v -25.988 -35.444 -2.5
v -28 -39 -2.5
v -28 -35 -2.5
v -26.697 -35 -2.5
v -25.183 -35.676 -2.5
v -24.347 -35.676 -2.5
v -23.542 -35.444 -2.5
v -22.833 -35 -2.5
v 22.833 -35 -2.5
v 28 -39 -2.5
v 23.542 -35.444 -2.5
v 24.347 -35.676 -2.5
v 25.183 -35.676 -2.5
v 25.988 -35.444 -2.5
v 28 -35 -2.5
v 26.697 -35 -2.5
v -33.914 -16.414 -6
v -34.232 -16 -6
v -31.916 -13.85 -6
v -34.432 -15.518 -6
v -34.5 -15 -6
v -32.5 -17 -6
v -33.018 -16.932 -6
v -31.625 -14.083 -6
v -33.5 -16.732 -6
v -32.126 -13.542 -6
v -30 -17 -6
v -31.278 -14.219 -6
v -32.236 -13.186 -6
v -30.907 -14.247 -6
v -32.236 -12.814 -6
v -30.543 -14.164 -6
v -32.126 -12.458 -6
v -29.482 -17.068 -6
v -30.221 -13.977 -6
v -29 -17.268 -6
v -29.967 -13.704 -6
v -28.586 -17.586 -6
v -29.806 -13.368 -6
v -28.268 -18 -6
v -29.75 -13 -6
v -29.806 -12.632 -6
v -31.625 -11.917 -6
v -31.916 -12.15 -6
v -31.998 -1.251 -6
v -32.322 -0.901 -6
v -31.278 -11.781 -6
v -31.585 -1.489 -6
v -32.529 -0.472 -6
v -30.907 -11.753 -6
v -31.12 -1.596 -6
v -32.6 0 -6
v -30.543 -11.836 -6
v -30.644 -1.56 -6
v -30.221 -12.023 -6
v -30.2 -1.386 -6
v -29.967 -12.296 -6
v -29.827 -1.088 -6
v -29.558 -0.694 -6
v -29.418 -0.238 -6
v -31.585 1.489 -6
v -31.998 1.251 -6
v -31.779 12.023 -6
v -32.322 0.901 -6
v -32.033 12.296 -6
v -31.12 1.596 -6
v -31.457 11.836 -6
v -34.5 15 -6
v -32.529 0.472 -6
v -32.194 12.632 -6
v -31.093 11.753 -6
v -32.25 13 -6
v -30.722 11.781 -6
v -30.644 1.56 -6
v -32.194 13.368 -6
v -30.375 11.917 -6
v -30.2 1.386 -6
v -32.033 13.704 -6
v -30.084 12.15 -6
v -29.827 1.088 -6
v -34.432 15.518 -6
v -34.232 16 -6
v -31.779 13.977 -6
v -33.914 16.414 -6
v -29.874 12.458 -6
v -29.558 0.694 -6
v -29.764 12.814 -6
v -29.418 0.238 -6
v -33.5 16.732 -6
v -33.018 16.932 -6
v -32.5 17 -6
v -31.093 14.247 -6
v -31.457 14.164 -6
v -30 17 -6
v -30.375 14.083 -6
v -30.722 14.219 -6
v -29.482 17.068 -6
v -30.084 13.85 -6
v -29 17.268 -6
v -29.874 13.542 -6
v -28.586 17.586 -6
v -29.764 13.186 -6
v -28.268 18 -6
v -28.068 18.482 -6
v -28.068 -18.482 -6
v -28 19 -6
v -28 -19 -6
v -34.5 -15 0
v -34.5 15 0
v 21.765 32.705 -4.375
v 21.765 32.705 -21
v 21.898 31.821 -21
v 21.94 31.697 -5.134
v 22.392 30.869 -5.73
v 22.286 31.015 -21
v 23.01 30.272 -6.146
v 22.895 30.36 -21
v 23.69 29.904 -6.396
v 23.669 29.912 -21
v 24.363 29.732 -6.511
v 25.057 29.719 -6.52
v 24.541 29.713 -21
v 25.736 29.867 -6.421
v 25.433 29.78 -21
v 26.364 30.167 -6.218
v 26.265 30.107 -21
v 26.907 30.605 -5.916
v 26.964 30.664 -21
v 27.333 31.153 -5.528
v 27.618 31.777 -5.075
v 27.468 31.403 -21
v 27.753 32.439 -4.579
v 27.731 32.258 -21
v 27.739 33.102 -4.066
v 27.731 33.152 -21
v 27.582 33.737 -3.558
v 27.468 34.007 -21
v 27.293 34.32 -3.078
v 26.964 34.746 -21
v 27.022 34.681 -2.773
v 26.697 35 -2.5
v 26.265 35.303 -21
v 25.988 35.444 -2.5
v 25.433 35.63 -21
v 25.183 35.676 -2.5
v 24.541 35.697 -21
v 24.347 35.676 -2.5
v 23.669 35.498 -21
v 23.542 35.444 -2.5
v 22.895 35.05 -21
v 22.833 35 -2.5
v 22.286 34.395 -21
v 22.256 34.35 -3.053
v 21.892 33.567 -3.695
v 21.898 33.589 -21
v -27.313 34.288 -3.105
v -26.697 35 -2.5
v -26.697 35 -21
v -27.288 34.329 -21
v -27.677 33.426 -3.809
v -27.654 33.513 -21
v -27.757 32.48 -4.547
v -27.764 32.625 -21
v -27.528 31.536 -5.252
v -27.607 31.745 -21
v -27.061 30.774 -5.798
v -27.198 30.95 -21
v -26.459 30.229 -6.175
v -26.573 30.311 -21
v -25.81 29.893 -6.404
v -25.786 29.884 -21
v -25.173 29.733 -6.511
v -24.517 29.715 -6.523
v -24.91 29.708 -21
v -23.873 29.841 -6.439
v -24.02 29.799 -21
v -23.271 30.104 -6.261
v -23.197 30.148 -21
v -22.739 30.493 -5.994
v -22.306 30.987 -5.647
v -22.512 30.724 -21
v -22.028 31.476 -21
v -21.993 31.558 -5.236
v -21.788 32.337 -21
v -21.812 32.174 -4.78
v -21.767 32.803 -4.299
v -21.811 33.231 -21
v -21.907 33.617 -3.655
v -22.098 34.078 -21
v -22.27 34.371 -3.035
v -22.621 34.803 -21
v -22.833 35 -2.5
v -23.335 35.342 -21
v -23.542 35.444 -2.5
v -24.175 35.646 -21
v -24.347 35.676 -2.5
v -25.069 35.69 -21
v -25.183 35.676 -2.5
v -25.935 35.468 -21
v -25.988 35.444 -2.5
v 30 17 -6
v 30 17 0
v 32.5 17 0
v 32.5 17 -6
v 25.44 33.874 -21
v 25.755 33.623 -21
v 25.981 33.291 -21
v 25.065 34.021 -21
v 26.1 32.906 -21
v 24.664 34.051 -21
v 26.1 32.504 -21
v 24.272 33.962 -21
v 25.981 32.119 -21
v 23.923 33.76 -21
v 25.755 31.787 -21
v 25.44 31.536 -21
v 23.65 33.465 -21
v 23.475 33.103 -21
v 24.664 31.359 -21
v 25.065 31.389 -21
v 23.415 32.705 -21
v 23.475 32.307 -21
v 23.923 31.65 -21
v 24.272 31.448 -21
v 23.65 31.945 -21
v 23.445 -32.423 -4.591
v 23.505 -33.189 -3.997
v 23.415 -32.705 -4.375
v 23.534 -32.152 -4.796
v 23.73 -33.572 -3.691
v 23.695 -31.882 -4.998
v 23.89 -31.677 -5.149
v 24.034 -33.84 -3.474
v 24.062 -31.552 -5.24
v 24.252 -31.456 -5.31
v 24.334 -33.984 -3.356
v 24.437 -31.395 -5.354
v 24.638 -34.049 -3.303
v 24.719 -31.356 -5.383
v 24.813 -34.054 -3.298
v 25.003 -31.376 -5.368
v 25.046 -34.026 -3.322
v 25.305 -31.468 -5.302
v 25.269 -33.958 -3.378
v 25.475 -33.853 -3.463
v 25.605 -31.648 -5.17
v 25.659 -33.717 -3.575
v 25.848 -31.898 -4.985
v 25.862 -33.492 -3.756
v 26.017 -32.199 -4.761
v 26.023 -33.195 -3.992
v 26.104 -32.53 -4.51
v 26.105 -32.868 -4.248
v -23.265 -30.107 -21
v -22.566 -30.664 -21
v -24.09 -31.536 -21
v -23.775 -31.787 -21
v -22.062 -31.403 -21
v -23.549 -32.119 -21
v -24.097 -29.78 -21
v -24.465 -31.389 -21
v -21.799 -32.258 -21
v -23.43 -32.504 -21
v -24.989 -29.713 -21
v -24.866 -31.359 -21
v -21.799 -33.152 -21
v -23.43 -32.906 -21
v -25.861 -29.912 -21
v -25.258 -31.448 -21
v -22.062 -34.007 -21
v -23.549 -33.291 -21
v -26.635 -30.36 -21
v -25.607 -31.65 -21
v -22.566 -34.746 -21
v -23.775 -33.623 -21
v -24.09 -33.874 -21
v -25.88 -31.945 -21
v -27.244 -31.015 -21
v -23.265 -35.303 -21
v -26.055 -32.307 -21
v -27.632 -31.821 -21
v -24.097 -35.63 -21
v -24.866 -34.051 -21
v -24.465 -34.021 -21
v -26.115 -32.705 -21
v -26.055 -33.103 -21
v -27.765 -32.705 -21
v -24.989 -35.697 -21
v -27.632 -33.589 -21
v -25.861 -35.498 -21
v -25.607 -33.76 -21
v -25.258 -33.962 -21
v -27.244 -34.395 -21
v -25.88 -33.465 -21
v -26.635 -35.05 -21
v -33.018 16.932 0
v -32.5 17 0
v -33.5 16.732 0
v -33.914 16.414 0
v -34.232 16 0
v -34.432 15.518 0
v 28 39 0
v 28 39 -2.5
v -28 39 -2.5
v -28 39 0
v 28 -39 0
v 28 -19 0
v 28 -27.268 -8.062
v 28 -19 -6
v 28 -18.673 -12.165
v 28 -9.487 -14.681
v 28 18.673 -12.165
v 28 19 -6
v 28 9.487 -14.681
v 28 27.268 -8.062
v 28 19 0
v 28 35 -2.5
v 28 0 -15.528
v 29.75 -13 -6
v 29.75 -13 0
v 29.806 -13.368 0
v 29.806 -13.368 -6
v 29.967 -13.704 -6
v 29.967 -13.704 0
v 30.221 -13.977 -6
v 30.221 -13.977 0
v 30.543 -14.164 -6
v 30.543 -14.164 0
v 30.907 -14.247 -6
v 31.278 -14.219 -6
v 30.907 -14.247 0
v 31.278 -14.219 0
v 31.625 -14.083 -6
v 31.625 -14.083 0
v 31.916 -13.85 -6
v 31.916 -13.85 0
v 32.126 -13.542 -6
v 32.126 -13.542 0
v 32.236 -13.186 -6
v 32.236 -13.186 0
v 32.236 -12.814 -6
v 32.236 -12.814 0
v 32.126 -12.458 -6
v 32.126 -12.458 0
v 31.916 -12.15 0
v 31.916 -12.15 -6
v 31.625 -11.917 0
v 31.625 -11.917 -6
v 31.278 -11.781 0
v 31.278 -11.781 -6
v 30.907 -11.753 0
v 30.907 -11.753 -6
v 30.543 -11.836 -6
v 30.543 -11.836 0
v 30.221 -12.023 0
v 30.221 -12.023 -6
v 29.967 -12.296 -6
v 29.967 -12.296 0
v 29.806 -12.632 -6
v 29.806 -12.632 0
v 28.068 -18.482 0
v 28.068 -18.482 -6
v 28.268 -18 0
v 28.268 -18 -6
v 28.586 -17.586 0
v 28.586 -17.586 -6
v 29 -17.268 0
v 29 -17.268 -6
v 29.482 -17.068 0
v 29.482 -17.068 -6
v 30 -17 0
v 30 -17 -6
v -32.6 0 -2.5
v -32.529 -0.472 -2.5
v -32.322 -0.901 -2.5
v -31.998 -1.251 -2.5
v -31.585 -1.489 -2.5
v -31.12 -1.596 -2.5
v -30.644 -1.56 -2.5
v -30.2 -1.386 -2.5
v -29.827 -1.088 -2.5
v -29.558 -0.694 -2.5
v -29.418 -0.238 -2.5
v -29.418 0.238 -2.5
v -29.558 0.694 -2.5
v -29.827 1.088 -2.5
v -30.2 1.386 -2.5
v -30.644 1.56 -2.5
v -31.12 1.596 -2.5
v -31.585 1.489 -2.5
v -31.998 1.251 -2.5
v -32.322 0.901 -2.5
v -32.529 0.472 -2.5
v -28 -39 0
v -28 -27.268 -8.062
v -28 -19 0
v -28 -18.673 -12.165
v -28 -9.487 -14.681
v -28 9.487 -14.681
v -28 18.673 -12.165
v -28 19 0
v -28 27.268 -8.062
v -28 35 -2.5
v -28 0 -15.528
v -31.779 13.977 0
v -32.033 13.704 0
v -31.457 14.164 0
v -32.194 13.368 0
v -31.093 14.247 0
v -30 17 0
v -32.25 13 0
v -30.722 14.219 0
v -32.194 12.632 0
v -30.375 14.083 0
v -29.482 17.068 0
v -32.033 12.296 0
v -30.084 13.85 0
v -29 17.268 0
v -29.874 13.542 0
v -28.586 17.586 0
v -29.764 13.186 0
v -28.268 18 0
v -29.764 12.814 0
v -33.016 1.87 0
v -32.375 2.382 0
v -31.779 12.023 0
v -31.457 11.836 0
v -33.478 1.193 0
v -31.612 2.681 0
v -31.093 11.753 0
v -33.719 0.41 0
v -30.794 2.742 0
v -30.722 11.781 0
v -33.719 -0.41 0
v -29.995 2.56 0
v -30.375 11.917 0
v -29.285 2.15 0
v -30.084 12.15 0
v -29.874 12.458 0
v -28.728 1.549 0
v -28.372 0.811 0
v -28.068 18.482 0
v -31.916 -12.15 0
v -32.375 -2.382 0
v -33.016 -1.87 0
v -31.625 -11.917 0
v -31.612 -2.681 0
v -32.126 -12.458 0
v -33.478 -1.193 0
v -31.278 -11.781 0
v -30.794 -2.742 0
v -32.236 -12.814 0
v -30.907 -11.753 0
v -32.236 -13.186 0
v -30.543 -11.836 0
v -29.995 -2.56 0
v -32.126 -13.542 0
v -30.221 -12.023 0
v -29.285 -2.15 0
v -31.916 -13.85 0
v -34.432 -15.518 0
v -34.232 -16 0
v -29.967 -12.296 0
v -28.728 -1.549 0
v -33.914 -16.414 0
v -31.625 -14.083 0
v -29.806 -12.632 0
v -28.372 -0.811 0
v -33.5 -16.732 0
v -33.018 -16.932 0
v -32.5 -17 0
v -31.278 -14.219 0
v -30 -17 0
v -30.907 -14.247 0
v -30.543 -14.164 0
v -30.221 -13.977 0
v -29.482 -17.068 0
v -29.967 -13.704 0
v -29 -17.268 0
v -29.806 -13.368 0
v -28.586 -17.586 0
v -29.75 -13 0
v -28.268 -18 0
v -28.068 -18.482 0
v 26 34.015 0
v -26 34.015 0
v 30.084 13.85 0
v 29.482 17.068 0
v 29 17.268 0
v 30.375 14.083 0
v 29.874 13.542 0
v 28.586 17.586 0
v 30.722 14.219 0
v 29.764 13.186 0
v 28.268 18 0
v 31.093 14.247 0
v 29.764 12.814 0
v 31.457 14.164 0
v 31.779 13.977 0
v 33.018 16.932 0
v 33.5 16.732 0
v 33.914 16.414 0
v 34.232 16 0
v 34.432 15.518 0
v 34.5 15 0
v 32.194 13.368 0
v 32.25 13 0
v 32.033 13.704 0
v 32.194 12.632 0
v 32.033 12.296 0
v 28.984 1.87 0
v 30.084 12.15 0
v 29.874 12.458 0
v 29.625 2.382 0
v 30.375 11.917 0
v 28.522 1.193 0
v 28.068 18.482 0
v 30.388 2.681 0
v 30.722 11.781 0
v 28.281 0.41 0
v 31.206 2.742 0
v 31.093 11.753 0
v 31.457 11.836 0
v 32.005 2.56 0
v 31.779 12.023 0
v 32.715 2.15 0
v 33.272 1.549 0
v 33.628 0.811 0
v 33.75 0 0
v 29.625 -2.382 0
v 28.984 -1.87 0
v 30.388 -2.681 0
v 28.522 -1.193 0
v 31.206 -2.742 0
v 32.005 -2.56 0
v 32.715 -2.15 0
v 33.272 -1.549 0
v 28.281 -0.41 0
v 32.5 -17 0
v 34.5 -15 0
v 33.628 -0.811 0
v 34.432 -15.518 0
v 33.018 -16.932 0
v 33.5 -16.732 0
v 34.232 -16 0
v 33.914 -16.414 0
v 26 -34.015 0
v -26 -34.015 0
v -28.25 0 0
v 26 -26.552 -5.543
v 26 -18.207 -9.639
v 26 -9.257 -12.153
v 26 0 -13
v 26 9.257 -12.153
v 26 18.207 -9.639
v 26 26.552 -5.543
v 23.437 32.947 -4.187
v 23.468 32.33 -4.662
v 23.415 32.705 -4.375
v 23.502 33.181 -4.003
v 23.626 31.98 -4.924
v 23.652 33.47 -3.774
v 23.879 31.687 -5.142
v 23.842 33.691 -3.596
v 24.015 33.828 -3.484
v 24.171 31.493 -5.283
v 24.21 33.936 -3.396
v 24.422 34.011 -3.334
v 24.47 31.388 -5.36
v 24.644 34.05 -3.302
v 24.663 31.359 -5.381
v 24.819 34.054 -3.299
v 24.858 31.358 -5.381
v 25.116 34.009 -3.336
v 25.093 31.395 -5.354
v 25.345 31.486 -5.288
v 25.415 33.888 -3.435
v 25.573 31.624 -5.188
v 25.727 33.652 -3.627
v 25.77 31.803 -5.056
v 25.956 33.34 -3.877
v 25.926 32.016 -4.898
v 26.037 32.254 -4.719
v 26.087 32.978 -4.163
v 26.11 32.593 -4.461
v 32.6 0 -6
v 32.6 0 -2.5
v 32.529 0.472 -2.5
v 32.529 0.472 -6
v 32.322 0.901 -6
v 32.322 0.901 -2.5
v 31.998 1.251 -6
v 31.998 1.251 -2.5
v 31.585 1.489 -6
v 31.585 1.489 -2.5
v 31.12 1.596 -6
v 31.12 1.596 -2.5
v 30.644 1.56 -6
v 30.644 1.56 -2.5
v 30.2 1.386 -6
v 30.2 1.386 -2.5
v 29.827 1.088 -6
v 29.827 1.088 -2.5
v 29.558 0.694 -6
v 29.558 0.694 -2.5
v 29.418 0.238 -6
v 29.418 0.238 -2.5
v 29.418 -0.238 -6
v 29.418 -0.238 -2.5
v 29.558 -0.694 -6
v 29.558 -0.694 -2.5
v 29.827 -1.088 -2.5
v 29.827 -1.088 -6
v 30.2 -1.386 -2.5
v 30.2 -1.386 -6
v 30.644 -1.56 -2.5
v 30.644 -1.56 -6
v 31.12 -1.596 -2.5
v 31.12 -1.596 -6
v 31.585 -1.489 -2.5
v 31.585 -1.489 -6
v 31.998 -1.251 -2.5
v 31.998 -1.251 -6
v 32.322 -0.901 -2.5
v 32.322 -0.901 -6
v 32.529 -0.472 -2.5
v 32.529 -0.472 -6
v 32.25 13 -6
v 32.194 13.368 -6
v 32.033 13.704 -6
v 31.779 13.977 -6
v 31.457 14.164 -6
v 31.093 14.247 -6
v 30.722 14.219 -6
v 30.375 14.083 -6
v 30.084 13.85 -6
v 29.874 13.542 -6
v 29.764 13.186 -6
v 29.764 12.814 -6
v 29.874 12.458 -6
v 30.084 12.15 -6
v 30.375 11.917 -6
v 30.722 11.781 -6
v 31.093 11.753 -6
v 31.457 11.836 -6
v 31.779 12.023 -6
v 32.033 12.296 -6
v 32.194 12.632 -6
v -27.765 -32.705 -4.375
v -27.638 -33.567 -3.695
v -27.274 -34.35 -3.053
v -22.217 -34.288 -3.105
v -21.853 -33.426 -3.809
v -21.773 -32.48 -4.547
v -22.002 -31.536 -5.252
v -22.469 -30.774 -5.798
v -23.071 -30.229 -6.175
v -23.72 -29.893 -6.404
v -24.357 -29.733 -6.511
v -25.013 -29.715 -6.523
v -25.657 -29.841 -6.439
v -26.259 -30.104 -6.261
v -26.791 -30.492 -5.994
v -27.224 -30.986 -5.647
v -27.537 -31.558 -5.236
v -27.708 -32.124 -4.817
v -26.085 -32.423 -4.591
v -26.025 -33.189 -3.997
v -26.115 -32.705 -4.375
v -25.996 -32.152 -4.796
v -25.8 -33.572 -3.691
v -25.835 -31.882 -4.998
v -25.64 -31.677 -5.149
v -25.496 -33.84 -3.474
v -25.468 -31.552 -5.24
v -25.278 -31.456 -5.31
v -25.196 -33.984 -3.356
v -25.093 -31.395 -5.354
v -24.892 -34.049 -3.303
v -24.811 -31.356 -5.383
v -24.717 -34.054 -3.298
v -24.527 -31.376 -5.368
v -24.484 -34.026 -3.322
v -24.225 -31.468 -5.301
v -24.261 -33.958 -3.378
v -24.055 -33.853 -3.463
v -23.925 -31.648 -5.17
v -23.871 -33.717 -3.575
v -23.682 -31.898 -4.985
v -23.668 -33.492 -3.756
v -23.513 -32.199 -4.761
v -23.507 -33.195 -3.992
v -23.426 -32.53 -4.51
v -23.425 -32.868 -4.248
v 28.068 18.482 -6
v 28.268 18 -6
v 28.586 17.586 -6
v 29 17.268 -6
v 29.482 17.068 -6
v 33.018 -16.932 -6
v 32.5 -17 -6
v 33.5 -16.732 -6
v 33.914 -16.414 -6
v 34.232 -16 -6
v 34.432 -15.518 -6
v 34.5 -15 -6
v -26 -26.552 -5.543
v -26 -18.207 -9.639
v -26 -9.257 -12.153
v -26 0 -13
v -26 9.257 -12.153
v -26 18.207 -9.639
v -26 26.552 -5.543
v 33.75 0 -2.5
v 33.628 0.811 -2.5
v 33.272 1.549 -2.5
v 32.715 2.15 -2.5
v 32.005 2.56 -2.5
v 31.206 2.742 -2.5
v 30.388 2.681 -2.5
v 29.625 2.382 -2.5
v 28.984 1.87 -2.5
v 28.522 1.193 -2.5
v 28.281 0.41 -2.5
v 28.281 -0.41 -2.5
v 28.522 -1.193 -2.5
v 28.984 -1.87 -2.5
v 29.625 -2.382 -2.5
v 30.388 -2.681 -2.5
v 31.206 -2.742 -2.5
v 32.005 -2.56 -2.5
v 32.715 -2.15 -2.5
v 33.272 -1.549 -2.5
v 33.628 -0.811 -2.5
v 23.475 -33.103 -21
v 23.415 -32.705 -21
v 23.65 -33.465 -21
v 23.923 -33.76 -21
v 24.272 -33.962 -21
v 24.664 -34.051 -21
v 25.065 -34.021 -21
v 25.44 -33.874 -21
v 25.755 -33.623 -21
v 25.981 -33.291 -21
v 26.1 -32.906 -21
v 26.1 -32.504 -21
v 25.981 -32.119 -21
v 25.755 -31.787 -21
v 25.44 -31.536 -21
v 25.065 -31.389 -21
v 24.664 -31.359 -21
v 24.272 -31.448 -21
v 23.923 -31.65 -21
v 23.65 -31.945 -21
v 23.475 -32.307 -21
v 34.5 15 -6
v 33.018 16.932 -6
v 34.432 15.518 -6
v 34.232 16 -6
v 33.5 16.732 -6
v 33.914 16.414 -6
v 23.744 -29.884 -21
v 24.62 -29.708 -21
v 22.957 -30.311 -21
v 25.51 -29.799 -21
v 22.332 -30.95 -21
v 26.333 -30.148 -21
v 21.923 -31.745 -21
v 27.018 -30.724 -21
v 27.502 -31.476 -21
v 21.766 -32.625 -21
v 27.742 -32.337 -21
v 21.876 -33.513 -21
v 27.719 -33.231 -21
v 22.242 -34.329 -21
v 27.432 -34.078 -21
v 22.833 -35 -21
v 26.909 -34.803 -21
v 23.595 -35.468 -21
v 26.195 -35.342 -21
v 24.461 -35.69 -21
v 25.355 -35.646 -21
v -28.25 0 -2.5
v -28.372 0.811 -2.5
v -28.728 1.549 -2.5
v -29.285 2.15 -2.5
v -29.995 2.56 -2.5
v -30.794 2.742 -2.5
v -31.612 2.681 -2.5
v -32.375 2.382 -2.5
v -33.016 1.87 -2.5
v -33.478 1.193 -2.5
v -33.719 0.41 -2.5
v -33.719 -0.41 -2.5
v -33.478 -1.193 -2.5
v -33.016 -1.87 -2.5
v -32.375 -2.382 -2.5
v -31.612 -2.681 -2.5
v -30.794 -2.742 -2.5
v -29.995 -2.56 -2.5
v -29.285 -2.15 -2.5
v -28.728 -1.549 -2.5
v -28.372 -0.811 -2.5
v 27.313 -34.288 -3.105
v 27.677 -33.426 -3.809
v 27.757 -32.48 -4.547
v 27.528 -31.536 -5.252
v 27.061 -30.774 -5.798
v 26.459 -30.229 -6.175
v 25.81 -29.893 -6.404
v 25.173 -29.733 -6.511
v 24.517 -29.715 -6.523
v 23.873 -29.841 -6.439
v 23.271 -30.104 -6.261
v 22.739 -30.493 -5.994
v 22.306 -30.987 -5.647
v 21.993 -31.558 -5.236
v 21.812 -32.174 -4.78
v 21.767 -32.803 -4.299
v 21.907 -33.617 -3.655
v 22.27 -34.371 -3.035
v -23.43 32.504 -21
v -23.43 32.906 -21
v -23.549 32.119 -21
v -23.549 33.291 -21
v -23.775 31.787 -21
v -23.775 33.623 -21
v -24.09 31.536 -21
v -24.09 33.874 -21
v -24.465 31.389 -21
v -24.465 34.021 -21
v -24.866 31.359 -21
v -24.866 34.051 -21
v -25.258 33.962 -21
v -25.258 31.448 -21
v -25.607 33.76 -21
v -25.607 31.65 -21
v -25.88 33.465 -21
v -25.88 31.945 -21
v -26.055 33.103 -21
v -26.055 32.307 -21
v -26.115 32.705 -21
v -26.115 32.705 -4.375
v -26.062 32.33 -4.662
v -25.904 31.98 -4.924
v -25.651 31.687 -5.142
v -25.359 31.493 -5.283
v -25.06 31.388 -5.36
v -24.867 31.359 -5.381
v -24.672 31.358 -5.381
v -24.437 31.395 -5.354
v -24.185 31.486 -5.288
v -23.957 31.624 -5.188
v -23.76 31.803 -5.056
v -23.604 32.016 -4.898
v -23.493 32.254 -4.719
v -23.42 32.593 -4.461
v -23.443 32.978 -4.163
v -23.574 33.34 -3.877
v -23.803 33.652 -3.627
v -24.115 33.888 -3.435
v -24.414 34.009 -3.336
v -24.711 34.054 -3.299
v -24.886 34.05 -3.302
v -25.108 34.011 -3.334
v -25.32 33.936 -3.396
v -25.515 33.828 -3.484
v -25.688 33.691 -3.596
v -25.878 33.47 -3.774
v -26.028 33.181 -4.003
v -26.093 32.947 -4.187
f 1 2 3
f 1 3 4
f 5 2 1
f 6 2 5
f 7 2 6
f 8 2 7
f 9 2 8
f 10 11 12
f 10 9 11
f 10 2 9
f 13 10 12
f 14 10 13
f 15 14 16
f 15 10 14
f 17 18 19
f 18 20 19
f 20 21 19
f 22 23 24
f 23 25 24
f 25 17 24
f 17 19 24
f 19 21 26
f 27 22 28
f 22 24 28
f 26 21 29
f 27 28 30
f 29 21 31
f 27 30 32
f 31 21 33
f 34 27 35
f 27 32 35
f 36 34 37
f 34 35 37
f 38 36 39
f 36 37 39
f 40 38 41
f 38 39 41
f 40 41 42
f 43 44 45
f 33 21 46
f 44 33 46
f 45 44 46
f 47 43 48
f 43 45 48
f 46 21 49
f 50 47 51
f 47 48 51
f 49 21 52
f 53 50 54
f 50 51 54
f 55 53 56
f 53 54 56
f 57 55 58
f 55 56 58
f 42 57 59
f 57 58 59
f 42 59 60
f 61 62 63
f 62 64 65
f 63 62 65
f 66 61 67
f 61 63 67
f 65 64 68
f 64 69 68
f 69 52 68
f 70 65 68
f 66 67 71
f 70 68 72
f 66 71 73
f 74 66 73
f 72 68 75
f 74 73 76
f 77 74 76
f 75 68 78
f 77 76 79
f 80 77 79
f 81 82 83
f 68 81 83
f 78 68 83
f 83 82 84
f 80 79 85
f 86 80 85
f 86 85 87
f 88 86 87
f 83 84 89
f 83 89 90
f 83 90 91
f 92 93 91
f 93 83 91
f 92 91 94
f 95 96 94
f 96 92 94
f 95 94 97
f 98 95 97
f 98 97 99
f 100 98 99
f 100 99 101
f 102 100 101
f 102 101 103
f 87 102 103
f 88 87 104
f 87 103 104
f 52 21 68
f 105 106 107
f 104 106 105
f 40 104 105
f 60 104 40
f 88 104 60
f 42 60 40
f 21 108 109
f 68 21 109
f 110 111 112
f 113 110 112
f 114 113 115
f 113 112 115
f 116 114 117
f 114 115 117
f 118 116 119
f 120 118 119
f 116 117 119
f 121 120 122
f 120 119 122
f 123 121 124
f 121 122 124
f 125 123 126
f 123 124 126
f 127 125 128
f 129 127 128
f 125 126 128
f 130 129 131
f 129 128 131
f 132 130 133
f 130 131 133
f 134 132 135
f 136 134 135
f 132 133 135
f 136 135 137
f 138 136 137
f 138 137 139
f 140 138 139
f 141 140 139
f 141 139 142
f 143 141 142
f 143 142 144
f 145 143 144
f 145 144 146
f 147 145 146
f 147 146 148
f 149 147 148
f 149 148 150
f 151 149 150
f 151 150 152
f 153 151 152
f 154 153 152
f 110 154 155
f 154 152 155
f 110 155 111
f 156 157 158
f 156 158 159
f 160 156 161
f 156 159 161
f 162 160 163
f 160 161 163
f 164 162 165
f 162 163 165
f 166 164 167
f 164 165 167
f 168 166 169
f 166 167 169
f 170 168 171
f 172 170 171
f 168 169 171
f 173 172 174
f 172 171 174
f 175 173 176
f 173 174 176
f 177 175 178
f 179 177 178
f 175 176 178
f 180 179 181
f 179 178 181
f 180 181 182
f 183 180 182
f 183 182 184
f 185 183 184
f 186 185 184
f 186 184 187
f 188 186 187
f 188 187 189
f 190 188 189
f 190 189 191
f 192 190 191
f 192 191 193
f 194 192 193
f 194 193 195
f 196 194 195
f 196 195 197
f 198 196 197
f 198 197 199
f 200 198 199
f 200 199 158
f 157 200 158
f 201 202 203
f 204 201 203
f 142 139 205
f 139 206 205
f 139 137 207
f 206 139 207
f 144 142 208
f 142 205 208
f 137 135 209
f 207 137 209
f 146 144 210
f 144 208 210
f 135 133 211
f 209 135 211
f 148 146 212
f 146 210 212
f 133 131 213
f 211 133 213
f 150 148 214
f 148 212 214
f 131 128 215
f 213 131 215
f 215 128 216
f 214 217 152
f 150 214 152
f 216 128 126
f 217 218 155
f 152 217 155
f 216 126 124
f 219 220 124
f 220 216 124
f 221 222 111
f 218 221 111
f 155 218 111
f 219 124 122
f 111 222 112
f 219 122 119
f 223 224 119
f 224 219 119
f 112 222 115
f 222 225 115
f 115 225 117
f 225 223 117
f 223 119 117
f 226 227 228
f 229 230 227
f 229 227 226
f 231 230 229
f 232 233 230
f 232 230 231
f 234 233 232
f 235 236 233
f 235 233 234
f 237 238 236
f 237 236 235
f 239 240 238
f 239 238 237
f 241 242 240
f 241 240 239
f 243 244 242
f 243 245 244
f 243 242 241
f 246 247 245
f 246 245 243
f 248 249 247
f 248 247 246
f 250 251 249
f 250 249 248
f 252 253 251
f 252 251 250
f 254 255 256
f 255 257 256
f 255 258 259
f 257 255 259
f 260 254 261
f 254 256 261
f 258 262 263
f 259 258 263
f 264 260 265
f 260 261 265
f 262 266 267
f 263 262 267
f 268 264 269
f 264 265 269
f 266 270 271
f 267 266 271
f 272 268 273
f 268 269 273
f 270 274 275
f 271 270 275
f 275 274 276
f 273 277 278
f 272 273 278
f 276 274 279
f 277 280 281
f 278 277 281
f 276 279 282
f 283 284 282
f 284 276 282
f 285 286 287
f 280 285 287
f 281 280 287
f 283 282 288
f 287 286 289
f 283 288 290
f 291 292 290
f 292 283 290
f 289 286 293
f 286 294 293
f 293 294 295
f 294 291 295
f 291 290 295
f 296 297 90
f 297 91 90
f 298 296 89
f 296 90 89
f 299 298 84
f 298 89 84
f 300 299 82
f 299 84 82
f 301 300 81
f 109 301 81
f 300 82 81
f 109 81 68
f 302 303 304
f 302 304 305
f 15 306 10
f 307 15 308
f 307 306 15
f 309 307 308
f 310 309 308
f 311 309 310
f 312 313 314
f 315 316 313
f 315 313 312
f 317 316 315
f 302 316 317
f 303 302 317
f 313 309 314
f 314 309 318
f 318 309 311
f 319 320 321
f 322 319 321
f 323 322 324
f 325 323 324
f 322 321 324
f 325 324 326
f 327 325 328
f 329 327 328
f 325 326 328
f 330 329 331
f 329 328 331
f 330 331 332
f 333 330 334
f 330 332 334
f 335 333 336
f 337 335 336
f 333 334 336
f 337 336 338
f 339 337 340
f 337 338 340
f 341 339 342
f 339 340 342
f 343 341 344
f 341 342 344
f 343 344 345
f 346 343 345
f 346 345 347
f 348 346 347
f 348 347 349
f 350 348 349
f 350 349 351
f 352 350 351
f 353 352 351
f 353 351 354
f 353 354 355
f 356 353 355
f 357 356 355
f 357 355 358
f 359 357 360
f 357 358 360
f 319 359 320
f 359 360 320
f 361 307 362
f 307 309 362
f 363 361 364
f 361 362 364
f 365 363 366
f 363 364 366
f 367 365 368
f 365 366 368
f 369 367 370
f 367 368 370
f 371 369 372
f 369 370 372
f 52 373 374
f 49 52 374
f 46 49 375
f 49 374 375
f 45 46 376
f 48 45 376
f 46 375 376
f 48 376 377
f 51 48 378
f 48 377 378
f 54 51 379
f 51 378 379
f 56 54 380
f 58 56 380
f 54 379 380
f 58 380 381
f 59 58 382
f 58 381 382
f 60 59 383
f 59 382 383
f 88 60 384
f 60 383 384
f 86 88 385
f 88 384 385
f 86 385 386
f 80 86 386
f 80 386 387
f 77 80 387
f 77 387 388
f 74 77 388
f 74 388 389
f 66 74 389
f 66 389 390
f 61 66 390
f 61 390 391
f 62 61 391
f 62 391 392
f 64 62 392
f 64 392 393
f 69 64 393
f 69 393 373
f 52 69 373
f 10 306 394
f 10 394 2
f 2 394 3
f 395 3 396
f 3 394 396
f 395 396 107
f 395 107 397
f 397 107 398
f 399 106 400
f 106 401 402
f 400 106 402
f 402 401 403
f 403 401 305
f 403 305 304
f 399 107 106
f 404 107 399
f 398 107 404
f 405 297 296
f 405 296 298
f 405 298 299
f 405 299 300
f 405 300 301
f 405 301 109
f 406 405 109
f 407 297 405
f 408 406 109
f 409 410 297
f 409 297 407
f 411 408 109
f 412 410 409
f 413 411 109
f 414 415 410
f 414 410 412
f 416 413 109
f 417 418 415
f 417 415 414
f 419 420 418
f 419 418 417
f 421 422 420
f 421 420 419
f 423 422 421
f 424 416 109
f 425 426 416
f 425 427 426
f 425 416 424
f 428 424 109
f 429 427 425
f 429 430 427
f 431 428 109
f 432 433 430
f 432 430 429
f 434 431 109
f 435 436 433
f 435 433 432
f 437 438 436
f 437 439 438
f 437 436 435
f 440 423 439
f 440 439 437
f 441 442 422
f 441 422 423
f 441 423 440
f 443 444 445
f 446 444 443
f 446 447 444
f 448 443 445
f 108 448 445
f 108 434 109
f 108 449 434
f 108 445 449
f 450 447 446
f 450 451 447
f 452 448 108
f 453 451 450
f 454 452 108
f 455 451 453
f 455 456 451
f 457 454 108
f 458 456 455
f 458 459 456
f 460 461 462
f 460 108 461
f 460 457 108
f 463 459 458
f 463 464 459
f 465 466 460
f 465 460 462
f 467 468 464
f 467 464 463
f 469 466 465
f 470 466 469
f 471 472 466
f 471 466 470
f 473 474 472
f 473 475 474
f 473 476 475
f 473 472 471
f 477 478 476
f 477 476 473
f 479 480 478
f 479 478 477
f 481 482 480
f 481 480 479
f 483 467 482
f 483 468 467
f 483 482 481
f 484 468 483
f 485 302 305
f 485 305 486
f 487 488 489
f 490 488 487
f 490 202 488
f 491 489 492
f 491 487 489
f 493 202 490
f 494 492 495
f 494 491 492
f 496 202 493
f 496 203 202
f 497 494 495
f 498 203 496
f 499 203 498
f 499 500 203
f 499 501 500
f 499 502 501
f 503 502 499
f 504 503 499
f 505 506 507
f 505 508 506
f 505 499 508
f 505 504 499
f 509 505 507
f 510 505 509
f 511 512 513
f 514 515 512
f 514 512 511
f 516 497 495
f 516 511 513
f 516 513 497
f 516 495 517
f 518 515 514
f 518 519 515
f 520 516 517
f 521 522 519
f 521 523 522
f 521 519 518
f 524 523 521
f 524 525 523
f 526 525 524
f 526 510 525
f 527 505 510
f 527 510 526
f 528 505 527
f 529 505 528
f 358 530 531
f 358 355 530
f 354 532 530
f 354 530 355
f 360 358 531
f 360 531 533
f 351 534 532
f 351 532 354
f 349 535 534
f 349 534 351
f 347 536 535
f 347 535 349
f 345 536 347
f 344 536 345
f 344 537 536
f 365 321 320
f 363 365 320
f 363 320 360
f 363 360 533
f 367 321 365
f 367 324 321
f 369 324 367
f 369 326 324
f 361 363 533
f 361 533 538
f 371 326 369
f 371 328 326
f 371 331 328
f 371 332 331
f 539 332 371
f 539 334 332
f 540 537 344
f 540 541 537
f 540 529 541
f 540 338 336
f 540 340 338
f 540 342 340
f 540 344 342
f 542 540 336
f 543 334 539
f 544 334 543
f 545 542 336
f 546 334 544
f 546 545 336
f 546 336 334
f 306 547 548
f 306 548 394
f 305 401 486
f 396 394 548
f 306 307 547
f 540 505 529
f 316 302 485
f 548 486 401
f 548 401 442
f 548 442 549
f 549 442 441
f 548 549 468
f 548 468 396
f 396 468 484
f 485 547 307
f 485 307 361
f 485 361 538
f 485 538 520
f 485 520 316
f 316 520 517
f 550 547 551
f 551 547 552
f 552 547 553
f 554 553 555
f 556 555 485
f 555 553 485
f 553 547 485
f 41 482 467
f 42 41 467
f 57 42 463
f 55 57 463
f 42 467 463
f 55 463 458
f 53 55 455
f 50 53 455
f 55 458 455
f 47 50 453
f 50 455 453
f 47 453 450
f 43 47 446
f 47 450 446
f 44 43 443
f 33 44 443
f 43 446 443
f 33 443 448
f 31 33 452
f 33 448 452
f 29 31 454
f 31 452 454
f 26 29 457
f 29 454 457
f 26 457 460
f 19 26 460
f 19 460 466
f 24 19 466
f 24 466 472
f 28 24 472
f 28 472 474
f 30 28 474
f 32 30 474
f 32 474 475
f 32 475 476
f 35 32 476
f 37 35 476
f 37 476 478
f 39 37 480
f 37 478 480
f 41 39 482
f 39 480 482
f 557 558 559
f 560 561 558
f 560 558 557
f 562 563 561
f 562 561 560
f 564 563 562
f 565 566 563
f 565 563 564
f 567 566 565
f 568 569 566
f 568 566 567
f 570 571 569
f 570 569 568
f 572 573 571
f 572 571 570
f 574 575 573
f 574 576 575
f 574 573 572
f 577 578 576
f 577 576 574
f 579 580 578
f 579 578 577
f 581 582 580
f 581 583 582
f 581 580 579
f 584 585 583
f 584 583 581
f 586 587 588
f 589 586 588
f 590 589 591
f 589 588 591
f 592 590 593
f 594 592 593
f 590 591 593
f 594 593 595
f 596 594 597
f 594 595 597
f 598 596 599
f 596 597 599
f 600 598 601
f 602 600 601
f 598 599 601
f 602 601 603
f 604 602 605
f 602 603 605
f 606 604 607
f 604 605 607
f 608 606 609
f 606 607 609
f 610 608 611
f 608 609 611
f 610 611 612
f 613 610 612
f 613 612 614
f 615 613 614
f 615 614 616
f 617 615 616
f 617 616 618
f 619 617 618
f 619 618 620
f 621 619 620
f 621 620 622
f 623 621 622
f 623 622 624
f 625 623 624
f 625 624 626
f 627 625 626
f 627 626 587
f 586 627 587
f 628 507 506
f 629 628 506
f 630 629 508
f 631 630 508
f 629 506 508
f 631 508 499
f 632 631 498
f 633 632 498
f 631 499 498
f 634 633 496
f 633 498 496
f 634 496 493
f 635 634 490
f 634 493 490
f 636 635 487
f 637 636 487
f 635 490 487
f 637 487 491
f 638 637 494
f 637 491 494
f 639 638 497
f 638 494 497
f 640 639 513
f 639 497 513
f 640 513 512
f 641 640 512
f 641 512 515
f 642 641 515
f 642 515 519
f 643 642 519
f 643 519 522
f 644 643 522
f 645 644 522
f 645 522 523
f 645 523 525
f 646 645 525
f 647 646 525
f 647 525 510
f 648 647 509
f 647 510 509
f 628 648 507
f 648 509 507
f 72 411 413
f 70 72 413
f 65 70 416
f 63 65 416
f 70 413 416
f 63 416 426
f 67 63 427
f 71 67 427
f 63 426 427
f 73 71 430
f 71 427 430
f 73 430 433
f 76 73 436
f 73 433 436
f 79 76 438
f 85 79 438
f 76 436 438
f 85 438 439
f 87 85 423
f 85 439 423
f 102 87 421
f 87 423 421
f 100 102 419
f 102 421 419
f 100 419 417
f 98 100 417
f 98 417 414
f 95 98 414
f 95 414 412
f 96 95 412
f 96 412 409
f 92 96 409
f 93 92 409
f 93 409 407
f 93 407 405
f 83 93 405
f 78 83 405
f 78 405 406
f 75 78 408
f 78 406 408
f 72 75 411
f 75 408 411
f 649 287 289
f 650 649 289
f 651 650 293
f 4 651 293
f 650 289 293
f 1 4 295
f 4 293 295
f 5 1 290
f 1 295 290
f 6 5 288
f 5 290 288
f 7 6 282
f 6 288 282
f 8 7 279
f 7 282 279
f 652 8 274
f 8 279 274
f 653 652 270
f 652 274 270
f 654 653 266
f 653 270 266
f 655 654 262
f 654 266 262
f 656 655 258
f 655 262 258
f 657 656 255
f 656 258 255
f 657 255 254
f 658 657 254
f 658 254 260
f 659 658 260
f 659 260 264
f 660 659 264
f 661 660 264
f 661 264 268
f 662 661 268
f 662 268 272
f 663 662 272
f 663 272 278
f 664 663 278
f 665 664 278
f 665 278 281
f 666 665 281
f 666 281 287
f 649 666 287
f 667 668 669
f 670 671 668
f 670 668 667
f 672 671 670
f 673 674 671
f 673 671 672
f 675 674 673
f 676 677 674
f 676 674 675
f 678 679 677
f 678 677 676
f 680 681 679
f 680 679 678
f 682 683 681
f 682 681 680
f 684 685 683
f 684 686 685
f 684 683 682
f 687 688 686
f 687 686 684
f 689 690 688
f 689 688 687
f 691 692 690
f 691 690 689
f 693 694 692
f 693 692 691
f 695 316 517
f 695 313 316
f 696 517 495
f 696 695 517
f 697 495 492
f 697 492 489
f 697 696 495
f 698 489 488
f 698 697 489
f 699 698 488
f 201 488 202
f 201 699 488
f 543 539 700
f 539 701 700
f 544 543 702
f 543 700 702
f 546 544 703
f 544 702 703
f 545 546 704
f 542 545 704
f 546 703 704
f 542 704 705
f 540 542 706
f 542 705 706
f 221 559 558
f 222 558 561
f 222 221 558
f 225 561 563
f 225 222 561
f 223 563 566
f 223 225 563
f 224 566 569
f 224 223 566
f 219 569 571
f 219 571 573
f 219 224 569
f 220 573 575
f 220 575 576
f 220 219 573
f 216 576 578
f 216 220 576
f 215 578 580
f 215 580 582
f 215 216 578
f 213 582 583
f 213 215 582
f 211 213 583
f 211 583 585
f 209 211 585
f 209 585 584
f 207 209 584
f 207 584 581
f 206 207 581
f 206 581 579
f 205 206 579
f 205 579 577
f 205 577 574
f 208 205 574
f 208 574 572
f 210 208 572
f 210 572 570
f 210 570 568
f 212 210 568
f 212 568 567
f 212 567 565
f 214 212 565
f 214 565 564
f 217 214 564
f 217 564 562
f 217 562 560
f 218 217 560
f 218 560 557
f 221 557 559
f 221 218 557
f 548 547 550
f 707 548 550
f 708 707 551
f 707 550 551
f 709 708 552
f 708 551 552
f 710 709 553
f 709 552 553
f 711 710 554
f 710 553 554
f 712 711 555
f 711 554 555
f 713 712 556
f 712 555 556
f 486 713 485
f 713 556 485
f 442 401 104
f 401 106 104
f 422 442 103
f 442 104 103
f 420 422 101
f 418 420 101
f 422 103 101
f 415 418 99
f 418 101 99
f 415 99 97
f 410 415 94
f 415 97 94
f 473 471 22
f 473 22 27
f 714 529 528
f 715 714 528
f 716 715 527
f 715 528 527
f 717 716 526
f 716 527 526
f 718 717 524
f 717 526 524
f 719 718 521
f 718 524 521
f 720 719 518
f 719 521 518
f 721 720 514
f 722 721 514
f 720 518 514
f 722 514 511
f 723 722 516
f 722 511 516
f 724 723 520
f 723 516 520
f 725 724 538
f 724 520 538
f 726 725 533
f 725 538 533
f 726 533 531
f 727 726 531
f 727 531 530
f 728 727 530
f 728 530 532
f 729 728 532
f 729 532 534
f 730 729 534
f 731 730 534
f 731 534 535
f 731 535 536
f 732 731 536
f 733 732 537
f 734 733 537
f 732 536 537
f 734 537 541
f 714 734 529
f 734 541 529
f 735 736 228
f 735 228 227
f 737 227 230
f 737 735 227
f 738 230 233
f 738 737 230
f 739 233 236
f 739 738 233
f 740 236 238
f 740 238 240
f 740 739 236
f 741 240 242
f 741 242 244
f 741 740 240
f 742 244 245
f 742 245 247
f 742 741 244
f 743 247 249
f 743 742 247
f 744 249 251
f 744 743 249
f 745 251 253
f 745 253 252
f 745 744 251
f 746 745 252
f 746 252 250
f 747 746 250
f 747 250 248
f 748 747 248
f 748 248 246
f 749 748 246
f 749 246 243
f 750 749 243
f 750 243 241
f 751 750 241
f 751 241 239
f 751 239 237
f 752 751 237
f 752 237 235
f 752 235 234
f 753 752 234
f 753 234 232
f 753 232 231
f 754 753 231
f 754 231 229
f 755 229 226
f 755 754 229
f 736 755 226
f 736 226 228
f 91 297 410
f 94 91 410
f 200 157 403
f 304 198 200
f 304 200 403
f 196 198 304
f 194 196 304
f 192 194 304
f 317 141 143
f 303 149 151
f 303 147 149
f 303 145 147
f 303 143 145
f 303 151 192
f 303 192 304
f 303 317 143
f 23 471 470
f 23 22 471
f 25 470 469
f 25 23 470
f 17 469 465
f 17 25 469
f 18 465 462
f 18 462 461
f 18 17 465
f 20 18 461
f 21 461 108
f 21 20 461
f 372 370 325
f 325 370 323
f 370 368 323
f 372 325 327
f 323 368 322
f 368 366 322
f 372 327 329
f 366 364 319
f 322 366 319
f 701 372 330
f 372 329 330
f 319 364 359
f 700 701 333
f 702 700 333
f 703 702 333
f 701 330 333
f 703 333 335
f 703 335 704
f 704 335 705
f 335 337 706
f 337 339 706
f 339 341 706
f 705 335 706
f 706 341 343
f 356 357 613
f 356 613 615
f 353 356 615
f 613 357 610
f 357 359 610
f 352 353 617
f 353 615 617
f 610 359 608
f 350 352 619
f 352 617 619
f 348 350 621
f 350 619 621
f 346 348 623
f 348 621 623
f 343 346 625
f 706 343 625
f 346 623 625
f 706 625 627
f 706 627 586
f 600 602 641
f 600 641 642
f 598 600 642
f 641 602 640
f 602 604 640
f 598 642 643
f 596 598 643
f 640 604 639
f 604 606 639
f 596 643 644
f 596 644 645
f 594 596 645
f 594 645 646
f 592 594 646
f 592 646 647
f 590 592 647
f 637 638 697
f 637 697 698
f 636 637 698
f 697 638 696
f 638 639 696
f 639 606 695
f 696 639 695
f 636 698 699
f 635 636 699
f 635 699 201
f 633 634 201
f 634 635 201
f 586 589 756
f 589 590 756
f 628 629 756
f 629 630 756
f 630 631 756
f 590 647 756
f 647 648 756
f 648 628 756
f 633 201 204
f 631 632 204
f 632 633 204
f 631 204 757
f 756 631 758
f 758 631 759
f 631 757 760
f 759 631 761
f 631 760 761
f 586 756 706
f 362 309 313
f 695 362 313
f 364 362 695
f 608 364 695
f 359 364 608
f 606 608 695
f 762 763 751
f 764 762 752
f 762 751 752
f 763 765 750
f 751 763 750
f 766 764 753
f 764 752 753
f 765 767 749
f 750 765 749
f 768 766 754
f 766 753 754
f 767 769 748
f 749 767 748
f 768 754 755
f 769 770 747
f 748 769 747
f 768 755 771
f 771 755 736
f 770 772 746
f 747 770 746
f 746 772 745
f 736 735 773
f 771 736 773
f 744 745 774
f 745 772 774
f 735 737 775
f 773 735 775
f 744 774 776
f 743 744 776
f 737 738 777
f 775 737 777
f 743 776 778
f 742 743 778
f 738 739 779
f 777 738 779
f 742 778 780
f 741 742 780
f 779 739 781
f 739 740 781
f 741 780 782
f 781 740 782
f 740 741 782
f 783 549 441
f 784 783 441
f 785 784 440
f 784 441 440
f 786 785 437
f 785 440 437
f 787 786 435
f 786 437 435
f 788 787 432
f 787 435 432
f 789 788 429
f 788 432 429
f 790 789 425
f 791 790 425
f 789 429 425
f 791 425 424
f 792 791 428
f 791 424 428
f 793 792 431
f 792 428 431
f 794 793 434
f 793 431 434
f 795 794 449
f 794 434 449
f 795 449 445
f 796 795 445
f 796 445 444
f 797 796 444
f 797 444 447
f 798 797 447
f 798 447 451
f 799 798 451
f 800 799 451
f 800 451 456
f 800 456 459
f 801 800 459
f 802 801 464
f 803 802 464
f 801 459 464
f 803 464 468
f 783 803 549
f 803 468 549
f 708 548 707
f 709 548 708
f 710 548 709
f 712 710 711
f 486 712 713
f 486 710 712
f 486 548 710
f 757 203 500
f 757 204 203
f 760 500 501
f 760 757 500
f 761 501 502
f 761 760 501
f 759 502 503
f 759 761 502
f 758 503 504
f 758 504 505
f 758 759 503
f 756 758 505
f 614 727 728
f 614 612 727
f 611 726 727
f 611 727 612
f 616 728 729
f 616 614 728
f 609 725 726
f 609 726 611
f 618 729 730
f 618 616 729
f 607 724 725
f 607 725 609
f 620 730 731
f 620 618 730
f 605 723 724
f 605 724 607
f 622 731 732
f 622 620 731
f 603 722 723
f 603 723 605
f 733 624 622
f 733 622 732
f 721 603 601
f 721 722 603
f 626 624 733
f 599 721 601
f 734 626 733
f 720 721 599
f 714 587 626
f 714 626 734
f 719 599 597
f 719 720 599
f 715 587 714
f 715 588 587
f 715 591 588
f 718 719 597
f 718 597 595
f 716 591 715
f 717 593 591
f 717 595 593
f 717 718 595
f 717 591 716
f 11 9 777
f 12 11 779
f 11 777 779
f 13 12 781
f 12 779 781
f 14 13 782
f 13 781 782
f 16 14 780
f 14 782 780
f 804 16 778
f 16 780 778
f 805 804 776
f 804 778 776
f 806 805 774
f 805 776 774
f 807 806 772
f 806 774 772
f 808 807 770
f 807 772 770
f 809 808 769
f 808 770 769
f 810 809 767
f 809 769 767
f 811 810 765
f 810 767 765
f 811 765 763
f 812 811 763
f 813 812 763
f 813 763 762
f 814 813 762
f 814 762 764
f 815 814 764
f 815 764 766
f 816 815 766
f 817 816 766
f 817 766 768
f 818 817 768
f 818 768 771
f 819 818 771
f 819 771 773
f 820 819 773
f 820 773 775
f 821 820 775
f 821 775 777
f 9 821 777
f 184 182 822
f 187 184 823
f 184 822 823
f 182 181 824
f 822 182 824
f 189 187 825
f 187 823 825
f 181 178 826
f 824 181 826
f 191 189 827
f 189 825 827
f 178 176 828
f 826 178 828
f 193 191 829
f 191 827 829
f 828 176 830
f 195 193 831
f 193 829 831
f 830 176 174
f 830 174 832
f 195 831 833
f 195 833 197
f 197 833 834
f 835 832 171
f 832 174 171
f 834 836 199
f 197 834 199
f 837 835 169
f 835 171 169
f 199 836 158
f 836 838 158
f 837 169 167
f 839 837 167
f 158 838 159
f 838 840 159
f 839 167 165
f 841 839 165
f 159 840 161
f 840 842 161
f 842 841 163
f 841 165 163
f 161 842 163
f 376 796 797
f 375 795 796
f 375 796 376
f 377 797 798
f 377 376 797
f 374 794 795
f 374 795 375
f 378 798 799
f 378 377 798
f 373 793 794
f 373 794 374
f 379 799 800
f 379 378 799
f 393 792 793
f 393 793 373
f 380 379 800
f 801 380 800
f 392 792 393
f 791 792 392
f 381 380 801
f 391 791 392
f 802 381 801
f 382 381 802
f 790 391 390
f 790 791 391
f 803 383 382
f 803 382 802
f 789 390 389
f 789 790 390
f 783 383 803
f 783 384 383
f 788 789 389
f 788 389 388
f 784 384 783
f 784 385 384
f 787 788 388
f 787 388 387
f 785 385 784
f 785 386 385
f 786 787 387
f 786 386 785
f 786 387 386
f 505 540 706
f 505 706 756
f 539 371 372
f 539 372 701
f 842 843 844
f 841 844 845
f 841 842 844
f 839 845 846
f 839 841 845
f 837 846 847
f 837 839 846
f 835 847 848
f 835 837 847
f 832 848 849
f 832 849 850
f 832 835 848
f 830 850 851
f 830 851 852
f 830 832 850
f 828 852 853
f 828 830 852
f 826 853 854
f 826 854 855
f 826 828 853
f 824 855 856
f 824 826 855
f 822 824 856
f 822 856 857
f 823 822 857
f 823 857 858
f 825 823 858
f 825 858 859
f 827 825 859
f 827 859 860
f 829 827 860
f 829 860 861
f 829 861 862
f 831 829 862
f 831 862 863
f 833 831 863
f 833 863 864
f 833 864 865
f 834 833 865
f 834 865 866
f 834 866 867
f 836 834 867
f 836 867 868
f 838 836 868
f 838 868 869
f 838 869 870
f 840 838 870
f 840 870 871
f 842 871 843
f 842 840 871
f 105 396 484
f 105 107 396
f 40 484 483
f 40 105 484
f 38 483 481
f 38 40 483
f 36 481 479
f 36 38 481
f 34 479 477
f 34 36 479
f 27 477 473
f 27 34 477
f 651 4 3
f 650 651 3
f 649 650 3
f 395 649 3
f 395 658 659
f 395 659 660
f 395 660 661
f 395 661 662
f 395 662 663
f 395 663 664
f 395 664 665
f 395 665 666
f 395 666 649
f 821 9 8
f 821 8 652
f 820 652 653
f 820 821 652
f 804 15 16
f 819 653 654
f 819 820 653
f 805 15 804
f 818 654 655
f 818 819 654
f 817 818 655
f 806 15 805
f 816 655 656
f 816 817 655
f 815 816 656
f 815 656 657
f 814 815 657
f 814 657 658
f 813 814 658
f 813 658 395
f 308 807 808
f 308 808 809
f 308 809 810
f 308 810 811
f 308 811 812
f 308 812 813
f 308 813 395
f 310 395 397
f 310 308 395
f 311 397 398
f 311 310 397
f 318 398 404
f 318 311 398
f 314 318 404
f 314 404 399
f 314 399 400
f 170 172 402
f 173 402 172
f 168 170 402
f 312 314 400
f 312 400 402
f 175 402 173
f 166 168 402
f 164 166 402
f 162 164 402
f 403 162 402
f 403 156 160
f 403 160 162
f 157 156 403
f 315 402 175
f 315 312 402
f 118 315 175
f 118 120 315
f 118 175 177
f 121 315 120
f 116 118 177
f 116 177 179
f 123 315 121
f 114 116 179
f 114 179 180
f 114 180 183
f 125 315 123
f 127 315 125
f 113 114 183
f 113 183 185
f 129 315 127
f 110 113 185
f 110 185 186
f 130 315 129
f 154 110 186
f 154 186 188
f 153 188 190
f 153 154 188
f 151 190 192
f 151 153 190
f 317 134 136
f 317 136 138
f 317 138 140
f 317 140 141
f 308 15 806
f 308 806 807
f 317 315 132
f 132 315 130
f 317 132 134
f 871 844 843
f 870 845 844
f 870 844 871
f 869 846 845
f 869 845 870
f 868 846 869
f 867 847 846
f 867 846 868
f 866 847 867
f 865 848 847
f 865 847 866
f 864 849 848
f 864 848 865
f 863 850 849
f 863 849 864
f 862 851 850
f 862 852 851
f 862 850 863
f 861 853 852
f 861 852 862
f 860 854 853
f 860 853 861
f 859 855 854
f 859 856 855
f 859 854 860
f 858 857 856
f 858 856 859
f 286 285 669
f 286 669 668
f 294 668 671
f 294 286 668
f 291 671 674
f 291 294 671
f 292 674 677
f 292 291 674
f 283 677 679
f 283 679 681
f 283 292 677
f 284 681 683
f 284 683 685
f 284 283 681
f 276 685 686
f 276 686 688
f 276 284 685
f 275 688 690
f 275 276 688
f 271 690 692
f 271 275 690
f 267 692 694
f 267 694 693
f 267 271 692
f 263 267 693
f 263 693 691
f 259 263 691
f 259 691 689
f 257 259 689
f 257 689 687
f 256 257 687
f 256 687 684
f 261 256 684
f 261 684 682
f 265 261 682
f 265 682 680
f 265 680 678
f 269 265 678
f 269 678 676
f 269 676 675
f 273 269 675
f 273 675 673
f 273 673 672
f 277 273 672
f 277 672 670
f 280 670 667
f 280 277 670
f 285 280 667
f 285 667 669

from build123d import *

# Parameters (mm, degrees)
EXTRUDE_1_DEPTH     = 26
EXTRUDE_START       = 2
EXTRUDE_2_DEPTH     = 2
EXTRUDE_3_DEPTH     = 2
SKETCH_7_W          = 6.5
SKETCH_7_H          = 34
SKETCH_7_R          = 1.6
SKETCH_7_R_2        = 1.25
EXTRUDE_4_DEPTH     = 6
FILLET_1_R          = 2
EXTRUDE_5_REACH     = 58.145
SKETCH_9_R          = 3
SKETCH_9_R_2        = 1.35
SKETCH_10_R         = 2.75
CUT_EXTRUDE_1_DEPTH = 2.5
CUT_EXTRUDE_4_DEPTH = 26


with BuildPart() as part:
    # 草图2 → 凸台-拉伸1 (new, symmetric)
    with BuildSketch(Plane(origin=(0, 0, 0), x_dir=(0, 0, -1), z_dir=(1, 0, 0))):
        with BuildLine():
            Line((0, 34.014702703), (0, 39))
            Line((0, 39), (2.5, 39))
            Line((2.5, 39), (2.5, 35))
            ThreePointArc((2.5, 35), (15.52803004, 0), (2.5, -35))
            Line((2.5, -35), (2.5, -39))
            Line((2.5, -39), (0, -39))
            Line((0, -39), (0, -34.014702703))
            ThreePointArc((0, -34.014702703), (13, 0), (0, 34.014702703))
        make_face()
    extrude(amount=EXTRUDE_1_DEPTH, both=True)

    # 草图3 → 凸台-拉伸2 (add)
    with BuildSketch(Plane(origin=(26, 0, 0), x_dir=(0, 0, -1), z_dir=(1, 0, 0)).offset(EXTRUDE_START)):
        with BuildLine():
            Line((0, 39), (0, -39))
            Line((0, -39), (2.5, -39))
            Line((2.5, -39), (2.5, -35))
            ThreePointArc((2.5, -35), (15.52803004, 0), (2.5, 35))
            Line((2.5, 35), (2.5, 39))
            Line((2.5, 39), (0, 39))
        make_face()
    extrude(amount=-EXTRUDE_2_DEPTH)

    # 草图4 → 凸台-拉伸3 (add)
    with BuildSketch(Plane.ZY.offset(26)):
        with BuildLine():
            Line((-2.5, 35), (-2.5, 39))
            Line((-2.5, 39), (0, 39))
            Line((0, 39), (0, -39))
            Line((0, -39), (-2.5, -39))
            Line((-2.5, -39), (-2.5, -35))
            ThreePointArc((-2.5, -35), (-15.52803004, 0), (-2.5, 35))
        make_face()
    extrude(amount=EXTRUDE_3_DEPTH)

    # 草图7 → 凸台-拉伸4 (add)
    # profile 1 of 2: a face of its own
    with BuildSketch(Plane.XY):
        with Locations((31.25, 0)):
            Rectangle(SKETCH_7_W, SKETCH_7_H)
        with Locations((31, 0)):
            Circle(SKETCH_7_R, mode=Mode.SUBTRACT)
        with Locations((31, 13)):
            Circle(SKETCH_7_R_2, mode=Mode.SUBTRACT)
        with Locations(Location((31, -13, 0), (0, 0, 180))):
            Circle(SKETCH_7_R_2, mode=Mode.SUBTRACT)
    # profile 2 of 2: a face of its own
    with BuildSketch(Plane.XY):
        with Locations((-31.25, 0)):
            Rectangle(SKETCH_7_W, SKETCH_7_H)
        with Locations((-31, -13)):
            Circle(SKETCH_7_R_2, mode=Mode.SUBTRACT)
        with Locations(Location((-31, 0, 0), (0, 0, 180))):
            Circle(SKETCH_7_R, mode=Mode.SUBTRACT)
        with Locations(Location((-31, 13, 0), (0, 0, 180))):
            Circle(SKETCH_7_R_2, mode=Mode.SUBTRACT)
    extrude(amount=-EXTRUDE_4_DEPTH)

    # 圆角1
    fillet_1_edges = [part.edges().sort_by_distance(p)[0] for p in [
        (28, -17, -3),
        (28, 17, -3),
        (34.5, 17, -3),
        (34.5, -17, -3),
        (-34.5, -17, -3),
        (-34.5, 17, -3),
        (-28, 17, -3),
        (-28, -17, -3),
    ]]
    fillet(fillet_1_edges, radius=FILLET_1_R)

    # 凸台-拉伸5: up to this face of the body (flat: up to its plane)
    extrude_5_end = Plane(part.part.faces().sort_by_distance((0, 37, -2.5))[0])
    # 草图9 → 凸台-拉伸5 (add, up to the picked face)
    with BuildSketch(Plane.XY.offset(-21), mode=Mode.PRIVATE) as extrude_5_sk1:
        with Locations(Location((-24.765, 32.705, 0), (0, 0, 130.093007985))):
            Circle(SKETCH_9_R)
        with Locations(Location((-24.765, 32.705, 0), (0, 0, 180))):
            Circle(SKETCH_9_R_2, mode=Mode.SUBTRACT)
    extrude_5_tool1 = split(extrude(extrude_5_sk1.sketch, amount=EXTRUDE_5_REACH, mode=Mode.PRIVATE), bisect_by=extrude_5_end, keep=Keep.BOTH, mode=Mode.PRIVATE)
    # 草图9 → 凸台-拉伸5 (add, up to the picked face)
    with BuildSketch(Plane.XY.offset(-21), mode=Mode.PRIVATE) as extrude_5_sk2:
        with Locations(Location((24.765, 32.705, 0), (0, 0, 180))):
            Circle(SKETCH_9_R)
        with Locations(Location((24.765, 32.705, 0), (0, 0, 180))):
            Circle(SKETCH_9_R_2, mode=Mode.SUBTRACT)
    extrude_5_tool2 = split(extrude(extrude_5_sk2.sketch, amount=EXTRUDE_5_REACH, mode=Mode.PRIVATE), bisect_by=extrude_5_end, keep=Keep.BOTH, mode=Mode.PRIVATE)
    # 草图9 → 凸台-拉伸5 (add, up to the picked face)
    with BuildSketch(Plane.XY.offset(-21), mode=Mode.PRIVATE) as extrude_5_sk3:
        with Locations(Location((24.765, -32.705, 0), (0, 0, 229.906992015))):
            Circle(SKETCH_9_R)
        with Locations(Location((24.765, -32.705, 0), (0, 0, 180))):
            Circle(SKETCH_9_R_2, mode=Mode.SUBTRACT)
    extrude_5_tool3 = split(extrude(extrude_5_sk3.sketch, amount=EXTRUDE_5_REACH, mode=Mode.PRIVATE), bisect_by=extrude_5_end, keep=Keep.BOTH, mode=Mode.PRIVATE)
    # 草图9 → 凸台-拉伸5 (add, up to the picked face)
    with BuildSketch(Plane.XY.offset(-21), mode=Mode.PRIVATE) as extrude_5_sk4:
        with Locations(Location((-24.765, -32.705, 0), (0, 0, 180))):
            Circle(SKETCH_9_R)
        with Locations(Location((-24.765, -32.705, 0), (0, 0, 180))):
            Circle(SKETCH_9_R_2, mode=Mode.SUBTRACT)
    extrude_5_tool4 = split(extrude(extrude_5_sk4.sketch, amount=EXTRUDE_5_REACH, mode=Mode.PRIVATE), bisect_by=extrude_5_end, keep=Keep.BOTH, mode=Mode.PRIVATE)
    add(extrude_5_tool1.solids().sort_by(Axis((-22.887557, 30.474912, -21), (0, 0, 1)))[0])
    add(extrude_5_tool2.solids().sort_by(Axis((27.680147, 32.705, -21), (0, 0, 1)))[0])
    add(extrude_5_tool3.solids().sort_by(Axis((26.642443, -30.474912, -21), (0, 0, 1)))[0])
    add(extrude_5_tool4.solids().sort_by(Axis((-21.849853, -32.705, -21), (0, 0, 1)))[0])

    # 草图10 → 切除-拉伸1 (cut)
    with BuildSketch(Plane.XY):
        with Locations((-31, 0)):
            Circle(SKETCH_10_R)
        with Locations((31, 0)):
            Circle(SKETCH_10_R)
    extrude(amount=-CUT_EXTRUDE_1_DEPTH, mode=Mode.SUBTRACT)

    # 草图12 → 切除-拉伸4 (cut, symmetric)
    with BuildSketch(Plane(origin=(0, 0, 0), x_dir=(0, 0, -1), z_dir=(1, 0, 0))):
        with BuildLine():
            Line((0, 34.014702703), (0, -34.014702703))
            ThreePointArc((0, -34.014702703), (13, 0), (0, 34.014702703))
        make_face()
    extrude(amount=CUT_EXTRUDE_4_DEPTH, both=True, mode=Mode.SUBTRACT)


solid = part.part
